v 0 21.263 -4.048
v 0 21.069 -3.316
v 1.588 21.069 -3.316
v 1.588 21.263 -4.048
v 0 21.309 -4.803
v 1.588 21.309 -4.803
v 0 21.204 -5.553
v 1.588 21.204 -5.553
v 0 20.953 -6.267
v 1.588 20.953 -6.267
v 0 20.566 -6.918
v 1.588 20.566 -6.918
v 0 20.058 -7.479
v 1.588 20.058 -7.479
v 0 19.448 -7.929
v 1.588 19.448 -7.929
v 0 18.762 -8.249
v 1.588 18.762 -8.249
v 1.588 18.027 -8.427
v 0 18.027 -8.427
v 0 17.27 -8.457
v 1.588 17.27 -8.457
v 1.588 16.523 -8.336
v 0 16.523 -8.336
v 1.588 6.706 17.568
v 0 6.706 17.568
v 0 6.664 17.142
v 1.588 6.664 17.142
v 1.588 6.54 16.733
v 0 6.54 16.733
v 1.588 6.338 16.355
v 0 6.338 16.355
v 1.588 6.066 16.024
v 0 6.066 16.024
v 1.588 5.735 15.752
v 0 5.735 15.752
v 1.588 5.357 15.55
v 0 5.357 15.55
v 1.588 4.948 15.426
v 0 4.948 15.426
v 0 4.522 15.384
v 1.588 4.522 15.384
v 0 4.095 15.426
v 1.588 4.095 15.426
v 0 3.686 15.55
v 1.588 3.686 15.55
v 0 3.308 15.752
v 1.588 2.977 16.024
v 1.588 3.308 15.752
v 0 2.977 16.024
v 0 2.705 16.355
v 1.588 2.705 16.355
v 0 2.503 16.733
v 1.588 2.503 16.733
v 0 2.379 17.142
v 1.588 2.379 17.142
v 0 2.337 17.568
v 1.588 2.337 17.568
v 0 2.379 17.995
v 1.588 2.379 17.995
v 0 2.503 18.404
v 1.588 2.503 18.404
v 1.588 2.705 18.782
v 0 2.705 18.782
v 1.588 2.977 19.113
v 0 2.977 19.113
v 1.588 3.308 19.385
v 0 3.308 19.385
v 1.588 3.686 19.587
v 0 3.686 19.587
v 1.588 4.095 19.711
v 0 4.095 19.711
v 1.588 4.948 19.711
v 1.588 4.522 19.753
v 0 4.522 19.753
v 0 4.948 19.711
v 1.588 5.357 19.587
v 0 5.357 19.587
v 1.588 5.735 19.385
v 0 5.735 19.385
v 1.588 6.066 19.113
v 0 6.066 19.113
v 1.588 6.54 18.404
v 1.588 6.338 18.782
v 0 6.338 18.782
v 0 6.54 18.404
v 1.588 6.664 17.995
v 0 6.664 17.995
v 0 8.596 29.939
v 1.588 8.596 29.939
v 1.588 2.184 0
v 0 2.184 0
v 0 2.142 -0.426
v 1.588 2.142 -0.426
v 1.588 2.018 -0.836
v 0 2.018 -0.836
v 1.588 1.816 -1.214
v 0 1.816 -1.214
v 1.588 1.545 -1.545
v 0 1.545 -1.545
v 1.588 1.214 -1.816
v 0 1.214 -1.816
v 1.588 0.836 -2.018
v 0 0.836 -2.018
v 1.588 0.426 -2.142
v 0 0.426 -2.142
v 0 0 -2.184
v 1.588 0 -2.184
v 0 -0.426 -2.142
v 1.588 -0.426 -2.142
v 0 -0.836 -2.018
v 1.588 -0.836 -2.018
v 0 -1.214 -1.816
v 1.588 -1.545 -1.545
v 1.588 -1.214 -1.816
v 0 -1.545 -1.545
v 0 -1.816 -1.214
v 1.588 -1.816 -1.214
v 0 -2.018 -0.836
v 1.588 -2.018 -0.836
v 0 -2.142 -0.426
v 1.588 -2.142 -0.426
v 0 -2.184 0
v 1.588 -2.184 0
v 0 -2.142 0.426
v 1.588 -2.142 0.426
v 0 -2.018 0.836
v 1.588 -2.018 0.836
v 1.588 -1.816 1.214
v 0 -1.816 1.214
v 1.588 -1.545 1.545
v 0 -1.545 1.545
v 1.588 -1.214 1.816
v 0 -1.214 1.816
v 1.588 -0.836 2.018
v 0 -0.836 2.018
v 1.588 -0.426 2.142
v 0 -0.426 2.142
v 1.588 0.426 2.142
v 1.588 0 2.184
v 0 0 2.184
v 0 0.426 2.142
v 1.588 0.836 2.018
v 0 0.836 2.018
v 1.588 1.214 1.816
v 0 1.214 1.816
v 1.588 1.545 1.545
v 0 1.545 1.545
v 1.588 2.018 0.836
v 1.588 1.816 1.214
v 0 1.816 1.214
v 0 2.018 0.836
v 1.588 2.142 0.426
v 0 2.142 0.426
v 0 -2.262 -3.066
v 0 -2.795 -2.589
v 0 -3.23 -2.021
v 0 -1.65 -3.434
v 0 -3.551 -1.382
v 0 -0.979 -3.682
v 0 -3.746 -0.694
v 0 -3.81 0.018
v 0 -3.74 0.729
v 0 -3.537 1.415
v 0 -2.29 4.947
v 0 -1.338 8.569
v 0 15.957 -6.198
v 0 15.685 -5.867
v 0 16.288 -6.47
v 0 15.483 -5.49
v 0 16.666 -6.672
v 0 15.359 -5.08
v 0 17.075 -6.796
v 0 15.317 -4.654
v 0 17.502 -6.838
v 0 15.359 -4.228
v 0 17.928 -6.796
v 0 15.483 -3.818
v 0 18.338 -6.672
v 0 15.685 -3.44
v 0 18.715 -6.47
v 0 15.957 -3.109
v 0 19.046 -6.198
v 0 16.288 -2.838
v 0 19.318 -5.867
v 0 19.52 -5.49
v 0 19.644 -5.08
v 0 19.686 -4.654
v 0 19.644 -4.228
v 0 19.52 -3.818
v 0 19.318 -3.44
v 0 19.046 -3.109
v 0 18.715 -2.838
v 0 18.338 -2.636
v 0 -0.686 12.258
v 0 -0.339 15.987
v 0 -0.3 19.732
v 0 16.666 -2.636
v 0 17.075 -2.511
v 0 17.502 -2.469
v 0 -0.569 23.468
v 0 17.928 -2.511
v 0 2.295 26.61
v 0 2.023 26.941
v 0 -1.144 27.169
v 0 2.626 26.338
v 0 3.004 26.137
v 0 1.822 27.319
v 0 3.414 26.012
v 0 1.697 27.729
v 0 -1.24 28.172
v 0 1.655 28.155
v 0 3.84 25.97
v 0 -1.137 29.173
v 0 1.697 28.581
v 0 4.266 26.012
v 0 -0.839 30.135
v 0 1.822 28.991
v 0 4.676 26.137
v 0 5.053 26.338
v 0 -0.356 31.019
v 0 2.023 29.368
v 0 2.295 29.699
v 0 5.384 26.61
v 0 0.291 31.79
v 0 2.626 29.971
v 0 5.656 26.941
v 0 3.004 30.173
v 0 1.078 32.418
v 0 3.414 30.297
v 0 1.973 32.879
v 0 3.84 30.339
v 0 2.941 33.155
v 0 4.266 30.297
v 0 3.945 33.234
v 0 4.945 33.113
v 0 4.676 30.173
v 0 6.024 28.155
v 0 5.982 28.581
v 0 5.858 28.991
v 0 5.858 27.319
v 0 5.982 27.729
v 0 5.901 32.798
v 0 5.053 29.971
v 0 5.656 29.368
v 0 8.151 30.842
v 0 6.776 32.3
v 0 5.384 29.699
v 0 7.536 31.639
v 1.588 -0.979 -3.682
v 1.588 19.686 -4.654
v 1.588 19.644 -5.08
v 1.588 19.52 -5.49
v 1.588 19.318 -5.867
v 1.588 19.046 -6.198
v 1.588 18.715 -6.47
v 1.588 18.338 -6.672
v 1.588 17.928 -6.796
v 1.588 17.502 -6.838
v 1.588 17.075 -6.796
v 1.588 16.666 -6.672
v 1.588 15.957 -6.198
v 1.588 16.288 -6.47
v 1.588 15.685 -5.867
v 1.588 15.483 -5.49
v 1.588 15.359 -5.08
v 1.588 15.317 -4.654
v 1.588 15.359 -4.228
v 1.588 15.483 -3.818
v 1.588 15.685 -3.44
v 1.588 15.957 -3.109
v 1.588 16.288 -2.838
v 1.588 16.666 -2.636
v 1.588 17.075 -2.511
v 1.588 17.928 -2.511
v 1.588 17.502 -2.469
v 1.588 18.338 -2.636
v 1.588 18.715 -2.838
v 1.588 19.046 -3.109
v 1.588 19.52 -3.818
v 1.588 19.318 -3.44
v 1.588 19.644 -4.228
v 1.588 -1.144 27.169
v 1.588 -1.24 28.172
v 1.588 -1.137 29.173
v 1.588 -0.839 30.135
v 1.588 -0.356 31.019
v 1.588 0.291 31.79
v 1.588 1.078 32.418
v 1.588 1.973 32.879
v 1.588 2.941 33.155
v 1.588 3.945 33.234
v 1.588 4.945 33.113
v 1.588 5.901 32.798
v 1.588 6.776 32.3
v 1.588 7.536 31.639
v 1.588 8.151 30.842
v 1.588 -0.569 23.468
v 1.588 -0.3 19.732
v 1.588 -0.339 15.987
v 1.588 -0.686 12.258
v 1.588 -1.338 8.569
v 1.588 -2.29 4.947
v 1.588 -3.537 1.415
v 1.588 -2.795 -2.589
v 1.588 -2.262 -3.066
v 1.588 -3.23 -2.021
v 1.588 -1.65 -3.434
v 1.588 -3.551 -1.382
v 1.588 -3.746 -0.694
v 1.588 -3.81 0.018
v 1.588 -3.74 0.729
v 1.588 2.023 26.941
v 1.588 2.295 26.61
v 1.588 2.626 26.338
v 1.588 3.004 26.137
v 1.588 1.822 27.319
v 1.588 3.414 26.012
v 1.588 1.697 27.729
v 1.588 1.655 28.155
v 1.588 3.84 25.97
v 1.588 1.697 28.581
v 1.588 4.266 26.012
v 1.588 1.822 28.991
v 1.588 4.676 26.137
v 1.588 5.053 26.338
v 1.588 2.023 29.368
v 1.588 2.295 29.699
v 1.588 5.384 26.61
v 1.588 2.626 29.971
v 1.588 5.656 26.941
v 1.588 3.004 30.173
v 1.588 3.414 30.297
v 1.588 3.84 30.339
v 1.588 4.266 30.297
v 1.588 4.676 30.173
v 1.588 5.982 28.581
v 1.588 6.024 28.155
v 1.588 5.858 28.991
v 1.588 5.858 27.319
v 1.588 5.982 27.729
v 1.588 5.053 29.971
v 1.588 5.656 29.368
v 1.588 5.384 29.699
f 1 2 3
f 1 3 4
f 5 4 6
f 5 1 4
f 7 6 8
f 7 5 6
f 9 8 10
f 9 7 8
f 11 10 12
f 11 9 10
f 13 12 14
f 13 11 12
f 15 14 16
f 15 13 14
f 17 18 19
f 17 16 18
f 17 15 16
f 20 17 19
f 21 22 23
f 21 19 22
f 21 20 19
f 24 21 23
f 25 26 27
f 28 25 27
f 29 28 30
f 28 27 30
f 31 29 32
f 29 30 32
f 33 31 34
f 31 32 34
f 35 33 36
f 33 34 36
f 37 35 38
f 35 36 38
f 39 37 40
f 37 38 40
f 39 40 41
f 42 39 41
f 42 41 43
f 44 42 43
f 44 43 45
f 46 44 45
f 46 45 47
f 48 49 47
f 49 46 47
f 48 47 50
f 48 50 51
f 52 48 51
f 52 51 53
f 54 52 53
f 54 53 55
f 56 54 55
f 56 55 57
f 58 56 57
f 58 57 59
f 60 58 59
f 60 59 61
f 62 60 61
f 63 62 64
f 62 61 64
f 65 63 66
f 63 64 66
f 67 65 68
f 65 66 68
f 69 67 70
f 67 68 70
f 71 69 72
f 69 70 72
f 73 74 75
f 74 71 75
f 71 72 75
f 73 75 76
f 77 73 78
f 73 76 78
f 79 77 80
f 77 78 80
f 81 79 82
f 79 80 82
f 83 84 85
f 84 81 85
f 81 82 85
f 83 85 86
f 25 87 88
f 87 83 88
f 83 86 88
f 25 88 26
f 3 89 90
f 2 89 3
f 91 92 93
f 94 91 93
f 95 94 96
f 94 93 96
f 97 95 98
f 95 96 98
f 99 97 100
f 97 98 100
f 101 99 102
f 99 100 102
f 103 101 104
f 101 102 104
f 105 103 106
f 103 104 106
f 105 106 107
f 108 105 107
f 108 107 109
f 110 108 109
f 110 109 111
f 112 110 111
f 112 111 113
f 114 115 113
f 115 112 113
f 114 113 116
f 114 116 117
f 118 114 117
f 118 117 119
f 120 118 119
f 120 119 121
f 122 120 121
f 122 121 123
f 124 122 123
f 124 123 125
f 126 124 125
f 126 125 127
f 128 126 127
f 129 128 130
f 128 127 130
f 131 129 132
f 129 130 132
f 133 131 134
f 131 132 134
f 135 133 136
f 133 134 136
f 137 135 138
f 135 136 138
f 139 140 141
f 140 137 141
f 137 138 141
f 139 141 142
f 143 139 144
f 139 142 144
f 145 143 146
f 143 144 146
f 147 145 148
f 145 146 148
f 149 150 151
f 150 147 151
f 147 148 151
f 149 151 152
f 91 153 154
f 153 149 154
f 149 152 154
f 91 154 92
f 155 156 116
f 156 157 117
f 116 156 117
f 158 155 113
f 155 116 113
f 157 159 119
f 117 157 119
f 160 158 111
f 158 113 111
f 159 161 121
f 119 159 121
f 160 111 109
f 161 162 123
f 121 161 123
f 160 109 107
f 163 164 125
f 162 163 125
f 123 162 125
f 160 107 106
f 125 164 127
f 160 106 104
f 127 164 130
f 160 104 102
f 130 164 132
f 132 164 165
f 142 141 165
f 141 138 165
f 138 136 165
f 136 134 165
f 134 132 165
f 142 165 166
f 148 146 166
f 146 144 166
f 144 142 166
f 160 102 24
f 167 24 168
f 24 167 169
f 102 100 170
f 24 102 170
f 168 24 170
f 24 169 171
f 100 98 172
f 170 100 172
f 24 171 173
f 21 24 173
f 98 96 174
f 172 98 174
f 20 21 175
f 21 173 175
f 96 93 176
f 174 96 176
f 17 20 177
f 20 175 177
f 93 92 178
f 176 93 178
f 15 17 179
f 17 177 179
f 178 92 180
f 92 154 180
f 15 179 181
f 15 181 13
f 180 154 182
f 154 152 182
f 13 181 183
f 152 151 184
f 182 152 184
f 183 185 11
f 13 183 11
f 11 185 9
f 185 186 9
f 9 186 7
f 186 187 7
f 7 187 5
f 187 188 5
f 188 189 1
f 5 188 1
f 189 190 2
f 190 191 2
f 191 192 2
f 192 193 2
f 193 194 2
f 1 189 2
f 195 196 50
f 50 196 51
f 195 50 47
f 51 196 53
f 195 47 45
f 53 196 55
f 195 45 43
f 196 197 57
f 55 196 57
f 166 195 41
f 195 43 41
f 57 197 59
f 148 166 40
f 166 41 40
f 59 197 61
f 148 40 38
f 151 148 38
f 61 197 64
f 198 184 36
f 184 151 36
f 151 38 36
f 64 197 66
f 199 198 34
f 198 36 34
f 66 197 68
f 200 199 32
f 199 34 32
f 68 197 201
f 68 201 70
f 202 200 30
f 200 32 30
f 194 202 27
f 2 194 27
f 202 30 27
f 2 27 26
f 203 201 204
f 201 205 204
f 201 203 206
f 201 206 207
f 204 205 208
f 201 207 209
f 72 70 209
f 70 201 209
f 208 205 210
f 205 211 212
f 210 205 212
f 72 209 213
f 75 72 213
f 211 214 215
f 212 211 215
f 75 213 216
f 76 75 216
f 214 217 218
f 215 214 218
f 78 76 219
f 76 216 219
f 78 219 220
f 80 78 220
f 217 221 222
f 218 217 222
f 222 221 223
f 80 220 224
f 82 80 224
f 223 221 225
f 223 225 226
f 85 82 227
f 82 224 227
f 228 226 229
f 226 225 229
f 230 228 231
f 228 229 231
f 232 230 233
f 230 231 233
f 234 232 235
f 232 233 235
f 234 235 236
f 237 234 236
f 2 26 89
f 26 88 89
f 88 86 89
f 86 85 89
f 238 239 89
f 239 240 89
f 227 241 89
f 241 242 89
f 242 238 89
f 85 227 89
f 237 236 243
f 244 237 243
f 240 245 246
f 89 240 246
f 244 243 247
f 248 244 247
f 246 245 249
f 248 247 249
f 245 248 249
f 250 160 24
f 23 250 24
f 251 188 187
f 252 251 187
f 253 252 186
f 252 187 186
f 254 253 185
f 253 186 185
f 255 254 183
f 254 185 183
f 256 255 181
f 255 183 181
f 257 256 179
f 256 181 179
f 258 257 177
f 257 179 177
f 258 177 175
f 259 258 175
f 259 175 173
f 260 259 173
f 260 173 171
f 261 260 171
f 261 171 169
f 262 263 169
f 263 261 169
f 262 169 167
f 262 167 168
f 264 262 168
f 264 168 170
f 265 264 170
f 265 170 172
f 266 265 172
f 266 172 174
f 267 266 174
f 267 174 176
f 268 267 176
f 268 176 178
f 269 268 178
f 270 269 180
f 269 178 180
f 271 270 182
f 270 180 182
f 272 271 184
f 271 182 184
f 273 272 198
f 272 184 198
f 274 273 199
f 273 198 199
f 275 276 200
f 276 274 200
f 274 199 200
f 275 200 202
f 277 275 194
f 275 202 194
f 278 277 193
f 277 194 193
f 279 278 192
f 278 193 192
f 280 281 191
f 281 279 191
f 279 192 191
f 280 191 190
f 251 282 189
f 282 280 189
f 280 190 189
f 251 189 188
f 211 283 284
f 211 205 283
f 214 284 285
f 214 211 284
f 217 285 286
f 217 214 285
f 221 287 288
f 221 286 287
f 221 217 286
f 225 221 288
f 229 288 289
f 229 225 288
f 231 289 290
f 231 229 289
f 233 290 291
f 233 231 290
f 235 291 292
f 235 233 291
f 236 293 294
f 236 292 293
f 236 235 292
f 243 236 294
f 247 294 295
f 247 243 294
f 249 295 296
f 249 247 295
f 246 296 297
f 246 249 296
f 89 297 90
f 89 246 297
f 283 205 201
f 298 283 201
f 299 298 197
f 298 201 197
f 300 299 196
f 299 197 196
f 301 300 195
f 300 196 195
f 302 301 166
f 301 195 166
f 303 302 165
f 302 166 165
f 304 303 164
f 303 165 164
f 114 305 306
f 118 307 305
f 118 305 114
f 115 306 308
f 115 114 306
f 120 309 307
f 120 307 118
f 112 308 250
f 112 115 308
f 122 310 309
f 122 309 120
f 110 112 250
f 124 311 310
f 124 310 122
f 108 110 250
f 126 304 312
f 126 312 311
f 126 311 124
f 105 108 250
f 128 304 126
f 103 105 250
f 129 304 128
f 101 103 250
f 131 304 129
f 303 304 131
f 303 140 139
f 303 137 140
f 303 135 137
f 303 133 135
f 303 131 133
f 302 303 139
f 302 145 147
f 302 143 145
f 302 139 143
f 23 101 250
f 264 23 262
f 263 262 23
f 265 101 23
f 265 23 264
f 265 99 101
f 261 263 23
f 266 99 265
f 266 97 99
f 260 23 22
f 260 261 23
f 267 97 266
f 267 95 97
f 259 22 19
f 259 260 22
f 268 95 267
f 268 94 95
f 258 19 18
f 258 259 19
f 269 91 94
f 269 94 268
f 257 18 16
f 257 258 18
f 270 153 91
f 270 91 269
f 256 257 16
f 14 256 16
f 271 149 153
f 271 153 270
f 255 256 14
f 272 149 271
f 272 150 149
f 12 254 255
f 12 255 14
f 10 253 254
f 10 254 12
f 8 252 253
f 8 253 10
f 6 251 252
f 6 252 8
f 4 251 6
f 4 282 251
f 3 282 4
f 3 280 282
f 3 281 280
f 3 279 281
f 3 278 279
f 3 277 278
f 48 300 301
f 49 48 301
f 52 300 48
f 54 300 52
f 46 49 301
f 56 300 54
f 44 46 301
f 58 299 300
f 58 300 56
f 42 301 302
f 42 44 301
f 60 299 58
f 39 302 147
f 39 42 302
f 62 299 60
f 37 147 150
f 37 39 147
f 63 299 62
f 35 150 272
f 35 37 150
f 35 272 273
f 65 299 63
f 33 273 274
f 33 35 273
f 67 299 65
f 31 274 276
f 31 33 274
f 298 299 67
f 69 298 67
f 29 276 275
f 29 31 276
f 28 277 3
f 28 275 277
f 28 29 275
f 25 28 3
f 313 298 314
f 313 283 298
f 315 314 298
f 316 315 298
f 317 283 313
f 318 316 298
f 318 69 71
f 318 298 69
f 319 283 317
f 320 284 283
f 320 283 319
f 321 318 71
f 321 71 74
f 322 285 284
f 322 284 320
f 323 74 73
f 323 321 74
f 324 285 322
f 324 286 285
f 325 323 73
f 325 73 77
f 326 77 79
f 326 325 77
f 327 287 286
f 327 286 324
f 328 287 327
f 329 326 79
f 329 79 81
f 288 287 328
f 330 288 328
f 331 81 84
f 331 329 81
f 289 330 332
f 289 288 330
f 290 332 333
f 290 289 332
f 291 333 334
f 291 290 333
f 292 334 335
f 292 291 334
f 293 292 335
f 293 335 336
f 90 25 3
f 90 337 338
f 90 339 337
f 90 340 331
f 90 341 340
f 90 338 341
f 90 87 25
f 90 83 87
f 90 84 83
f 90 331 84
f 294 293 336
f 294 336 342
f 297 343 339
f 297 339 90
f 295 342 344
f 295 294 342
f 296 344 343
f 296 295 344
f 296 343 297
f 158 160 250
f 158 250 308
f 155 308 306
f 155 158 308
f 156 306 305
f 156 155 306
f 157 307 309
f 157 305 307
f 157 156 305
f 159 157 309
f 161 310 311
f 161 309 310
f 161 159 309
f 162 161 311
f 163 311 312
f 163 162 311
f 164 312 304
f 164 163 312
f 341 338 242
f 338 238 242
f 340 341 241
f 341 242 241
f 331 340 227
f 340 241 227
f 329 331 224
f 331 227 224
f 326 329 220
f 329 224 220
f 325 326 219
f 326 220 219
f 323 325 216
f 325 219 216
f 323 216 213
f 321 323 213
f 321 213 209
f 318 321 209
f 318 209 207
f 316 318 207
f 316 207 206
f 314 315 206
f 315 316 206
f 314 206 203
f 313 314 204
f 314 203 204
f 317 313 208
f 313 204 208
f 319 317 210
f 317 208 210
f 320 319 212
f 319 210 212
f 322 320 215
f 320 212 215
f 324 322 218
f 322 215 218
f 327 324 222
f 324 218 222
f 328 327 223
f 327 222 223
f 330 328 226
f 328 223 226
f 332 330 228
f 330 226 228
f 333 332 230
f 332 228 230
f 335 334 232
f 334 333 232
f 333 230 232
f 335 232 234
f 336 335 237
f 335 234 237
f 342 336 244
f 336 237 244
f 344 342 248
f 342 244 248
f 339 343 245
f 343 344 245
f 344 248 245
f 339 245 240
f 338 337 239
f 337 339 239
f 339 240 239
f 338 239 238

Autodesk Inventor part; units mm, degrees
ref_plane "YZ Plane" through (0, 0, 0) normal (1, 0, 0) x (0, 1, 0)
ref_plane "XZ Plane" through (0, 0, 0) normal (0, 1, 0) x (-1, 0, 0)
ref_plane "XY Plane" through (0, 0, 0) normal (0, 0, 1) x (1, 0, 0)
sketch "Sketch1" plane through (0, 0, 0) normal (1, 0, 0) x (0, 1, 0)
  circle A0 centre (0, 0) radius 2.1844
  circle A1 centre (0, 0) radius 3.81
  circle A2 centre (3.8397, 28.1547) radius 2.1844
  circle A3 centre (3.8397, 28.1547) radius 5.08
  line L0 (0, 0) -> (16.51, 0) construction
  circle A4 centre (17.5016, -4.6538) radius 2.1844
  line L1 (0, 0) -> (16.51, 0) construction
  circle A5 centre (4.5215, 17.5685) radius 2.1844
  circle A6 centre (4.5215, 17.5685) radius 3.81
  circle A7 centre (17.5016, -4.6538) radius 3.81
  line L2 (0, 0) -> (12.7, 0) construction
  line L3 (-0.9791, -3.6821) -> (16.5226, -8.3359)
  line L4 (8.5961, 29.9387) -> (21.069, -3.3158)
  arc A8 (-3.5374, 1.4152) -> (-1.1438, 27.1693) centre (-45.8278, 18.334) ccw
  point P0 (-1.2195, 28.6143)
  point P1 (-3.7944, 0.3447)
  dimension "d0" = 4.3688
  dimension "d1" = 7.62
  dimension "d3" = 4.3688
  dimension "d4" = 10.16
  dimension "d8" = 4.3688
  dimension "d11" = 4.3688
  dimension "d12" = 7.62
  dimension "d13" = 7.62
extrude "Extrusion1" add sketch "Sketch1" along normal blind 1.5875 contours A1 | A1 A8 A3 L4 A7 L3 | A3 | A7 | A6
properties part number "rotationmount"
